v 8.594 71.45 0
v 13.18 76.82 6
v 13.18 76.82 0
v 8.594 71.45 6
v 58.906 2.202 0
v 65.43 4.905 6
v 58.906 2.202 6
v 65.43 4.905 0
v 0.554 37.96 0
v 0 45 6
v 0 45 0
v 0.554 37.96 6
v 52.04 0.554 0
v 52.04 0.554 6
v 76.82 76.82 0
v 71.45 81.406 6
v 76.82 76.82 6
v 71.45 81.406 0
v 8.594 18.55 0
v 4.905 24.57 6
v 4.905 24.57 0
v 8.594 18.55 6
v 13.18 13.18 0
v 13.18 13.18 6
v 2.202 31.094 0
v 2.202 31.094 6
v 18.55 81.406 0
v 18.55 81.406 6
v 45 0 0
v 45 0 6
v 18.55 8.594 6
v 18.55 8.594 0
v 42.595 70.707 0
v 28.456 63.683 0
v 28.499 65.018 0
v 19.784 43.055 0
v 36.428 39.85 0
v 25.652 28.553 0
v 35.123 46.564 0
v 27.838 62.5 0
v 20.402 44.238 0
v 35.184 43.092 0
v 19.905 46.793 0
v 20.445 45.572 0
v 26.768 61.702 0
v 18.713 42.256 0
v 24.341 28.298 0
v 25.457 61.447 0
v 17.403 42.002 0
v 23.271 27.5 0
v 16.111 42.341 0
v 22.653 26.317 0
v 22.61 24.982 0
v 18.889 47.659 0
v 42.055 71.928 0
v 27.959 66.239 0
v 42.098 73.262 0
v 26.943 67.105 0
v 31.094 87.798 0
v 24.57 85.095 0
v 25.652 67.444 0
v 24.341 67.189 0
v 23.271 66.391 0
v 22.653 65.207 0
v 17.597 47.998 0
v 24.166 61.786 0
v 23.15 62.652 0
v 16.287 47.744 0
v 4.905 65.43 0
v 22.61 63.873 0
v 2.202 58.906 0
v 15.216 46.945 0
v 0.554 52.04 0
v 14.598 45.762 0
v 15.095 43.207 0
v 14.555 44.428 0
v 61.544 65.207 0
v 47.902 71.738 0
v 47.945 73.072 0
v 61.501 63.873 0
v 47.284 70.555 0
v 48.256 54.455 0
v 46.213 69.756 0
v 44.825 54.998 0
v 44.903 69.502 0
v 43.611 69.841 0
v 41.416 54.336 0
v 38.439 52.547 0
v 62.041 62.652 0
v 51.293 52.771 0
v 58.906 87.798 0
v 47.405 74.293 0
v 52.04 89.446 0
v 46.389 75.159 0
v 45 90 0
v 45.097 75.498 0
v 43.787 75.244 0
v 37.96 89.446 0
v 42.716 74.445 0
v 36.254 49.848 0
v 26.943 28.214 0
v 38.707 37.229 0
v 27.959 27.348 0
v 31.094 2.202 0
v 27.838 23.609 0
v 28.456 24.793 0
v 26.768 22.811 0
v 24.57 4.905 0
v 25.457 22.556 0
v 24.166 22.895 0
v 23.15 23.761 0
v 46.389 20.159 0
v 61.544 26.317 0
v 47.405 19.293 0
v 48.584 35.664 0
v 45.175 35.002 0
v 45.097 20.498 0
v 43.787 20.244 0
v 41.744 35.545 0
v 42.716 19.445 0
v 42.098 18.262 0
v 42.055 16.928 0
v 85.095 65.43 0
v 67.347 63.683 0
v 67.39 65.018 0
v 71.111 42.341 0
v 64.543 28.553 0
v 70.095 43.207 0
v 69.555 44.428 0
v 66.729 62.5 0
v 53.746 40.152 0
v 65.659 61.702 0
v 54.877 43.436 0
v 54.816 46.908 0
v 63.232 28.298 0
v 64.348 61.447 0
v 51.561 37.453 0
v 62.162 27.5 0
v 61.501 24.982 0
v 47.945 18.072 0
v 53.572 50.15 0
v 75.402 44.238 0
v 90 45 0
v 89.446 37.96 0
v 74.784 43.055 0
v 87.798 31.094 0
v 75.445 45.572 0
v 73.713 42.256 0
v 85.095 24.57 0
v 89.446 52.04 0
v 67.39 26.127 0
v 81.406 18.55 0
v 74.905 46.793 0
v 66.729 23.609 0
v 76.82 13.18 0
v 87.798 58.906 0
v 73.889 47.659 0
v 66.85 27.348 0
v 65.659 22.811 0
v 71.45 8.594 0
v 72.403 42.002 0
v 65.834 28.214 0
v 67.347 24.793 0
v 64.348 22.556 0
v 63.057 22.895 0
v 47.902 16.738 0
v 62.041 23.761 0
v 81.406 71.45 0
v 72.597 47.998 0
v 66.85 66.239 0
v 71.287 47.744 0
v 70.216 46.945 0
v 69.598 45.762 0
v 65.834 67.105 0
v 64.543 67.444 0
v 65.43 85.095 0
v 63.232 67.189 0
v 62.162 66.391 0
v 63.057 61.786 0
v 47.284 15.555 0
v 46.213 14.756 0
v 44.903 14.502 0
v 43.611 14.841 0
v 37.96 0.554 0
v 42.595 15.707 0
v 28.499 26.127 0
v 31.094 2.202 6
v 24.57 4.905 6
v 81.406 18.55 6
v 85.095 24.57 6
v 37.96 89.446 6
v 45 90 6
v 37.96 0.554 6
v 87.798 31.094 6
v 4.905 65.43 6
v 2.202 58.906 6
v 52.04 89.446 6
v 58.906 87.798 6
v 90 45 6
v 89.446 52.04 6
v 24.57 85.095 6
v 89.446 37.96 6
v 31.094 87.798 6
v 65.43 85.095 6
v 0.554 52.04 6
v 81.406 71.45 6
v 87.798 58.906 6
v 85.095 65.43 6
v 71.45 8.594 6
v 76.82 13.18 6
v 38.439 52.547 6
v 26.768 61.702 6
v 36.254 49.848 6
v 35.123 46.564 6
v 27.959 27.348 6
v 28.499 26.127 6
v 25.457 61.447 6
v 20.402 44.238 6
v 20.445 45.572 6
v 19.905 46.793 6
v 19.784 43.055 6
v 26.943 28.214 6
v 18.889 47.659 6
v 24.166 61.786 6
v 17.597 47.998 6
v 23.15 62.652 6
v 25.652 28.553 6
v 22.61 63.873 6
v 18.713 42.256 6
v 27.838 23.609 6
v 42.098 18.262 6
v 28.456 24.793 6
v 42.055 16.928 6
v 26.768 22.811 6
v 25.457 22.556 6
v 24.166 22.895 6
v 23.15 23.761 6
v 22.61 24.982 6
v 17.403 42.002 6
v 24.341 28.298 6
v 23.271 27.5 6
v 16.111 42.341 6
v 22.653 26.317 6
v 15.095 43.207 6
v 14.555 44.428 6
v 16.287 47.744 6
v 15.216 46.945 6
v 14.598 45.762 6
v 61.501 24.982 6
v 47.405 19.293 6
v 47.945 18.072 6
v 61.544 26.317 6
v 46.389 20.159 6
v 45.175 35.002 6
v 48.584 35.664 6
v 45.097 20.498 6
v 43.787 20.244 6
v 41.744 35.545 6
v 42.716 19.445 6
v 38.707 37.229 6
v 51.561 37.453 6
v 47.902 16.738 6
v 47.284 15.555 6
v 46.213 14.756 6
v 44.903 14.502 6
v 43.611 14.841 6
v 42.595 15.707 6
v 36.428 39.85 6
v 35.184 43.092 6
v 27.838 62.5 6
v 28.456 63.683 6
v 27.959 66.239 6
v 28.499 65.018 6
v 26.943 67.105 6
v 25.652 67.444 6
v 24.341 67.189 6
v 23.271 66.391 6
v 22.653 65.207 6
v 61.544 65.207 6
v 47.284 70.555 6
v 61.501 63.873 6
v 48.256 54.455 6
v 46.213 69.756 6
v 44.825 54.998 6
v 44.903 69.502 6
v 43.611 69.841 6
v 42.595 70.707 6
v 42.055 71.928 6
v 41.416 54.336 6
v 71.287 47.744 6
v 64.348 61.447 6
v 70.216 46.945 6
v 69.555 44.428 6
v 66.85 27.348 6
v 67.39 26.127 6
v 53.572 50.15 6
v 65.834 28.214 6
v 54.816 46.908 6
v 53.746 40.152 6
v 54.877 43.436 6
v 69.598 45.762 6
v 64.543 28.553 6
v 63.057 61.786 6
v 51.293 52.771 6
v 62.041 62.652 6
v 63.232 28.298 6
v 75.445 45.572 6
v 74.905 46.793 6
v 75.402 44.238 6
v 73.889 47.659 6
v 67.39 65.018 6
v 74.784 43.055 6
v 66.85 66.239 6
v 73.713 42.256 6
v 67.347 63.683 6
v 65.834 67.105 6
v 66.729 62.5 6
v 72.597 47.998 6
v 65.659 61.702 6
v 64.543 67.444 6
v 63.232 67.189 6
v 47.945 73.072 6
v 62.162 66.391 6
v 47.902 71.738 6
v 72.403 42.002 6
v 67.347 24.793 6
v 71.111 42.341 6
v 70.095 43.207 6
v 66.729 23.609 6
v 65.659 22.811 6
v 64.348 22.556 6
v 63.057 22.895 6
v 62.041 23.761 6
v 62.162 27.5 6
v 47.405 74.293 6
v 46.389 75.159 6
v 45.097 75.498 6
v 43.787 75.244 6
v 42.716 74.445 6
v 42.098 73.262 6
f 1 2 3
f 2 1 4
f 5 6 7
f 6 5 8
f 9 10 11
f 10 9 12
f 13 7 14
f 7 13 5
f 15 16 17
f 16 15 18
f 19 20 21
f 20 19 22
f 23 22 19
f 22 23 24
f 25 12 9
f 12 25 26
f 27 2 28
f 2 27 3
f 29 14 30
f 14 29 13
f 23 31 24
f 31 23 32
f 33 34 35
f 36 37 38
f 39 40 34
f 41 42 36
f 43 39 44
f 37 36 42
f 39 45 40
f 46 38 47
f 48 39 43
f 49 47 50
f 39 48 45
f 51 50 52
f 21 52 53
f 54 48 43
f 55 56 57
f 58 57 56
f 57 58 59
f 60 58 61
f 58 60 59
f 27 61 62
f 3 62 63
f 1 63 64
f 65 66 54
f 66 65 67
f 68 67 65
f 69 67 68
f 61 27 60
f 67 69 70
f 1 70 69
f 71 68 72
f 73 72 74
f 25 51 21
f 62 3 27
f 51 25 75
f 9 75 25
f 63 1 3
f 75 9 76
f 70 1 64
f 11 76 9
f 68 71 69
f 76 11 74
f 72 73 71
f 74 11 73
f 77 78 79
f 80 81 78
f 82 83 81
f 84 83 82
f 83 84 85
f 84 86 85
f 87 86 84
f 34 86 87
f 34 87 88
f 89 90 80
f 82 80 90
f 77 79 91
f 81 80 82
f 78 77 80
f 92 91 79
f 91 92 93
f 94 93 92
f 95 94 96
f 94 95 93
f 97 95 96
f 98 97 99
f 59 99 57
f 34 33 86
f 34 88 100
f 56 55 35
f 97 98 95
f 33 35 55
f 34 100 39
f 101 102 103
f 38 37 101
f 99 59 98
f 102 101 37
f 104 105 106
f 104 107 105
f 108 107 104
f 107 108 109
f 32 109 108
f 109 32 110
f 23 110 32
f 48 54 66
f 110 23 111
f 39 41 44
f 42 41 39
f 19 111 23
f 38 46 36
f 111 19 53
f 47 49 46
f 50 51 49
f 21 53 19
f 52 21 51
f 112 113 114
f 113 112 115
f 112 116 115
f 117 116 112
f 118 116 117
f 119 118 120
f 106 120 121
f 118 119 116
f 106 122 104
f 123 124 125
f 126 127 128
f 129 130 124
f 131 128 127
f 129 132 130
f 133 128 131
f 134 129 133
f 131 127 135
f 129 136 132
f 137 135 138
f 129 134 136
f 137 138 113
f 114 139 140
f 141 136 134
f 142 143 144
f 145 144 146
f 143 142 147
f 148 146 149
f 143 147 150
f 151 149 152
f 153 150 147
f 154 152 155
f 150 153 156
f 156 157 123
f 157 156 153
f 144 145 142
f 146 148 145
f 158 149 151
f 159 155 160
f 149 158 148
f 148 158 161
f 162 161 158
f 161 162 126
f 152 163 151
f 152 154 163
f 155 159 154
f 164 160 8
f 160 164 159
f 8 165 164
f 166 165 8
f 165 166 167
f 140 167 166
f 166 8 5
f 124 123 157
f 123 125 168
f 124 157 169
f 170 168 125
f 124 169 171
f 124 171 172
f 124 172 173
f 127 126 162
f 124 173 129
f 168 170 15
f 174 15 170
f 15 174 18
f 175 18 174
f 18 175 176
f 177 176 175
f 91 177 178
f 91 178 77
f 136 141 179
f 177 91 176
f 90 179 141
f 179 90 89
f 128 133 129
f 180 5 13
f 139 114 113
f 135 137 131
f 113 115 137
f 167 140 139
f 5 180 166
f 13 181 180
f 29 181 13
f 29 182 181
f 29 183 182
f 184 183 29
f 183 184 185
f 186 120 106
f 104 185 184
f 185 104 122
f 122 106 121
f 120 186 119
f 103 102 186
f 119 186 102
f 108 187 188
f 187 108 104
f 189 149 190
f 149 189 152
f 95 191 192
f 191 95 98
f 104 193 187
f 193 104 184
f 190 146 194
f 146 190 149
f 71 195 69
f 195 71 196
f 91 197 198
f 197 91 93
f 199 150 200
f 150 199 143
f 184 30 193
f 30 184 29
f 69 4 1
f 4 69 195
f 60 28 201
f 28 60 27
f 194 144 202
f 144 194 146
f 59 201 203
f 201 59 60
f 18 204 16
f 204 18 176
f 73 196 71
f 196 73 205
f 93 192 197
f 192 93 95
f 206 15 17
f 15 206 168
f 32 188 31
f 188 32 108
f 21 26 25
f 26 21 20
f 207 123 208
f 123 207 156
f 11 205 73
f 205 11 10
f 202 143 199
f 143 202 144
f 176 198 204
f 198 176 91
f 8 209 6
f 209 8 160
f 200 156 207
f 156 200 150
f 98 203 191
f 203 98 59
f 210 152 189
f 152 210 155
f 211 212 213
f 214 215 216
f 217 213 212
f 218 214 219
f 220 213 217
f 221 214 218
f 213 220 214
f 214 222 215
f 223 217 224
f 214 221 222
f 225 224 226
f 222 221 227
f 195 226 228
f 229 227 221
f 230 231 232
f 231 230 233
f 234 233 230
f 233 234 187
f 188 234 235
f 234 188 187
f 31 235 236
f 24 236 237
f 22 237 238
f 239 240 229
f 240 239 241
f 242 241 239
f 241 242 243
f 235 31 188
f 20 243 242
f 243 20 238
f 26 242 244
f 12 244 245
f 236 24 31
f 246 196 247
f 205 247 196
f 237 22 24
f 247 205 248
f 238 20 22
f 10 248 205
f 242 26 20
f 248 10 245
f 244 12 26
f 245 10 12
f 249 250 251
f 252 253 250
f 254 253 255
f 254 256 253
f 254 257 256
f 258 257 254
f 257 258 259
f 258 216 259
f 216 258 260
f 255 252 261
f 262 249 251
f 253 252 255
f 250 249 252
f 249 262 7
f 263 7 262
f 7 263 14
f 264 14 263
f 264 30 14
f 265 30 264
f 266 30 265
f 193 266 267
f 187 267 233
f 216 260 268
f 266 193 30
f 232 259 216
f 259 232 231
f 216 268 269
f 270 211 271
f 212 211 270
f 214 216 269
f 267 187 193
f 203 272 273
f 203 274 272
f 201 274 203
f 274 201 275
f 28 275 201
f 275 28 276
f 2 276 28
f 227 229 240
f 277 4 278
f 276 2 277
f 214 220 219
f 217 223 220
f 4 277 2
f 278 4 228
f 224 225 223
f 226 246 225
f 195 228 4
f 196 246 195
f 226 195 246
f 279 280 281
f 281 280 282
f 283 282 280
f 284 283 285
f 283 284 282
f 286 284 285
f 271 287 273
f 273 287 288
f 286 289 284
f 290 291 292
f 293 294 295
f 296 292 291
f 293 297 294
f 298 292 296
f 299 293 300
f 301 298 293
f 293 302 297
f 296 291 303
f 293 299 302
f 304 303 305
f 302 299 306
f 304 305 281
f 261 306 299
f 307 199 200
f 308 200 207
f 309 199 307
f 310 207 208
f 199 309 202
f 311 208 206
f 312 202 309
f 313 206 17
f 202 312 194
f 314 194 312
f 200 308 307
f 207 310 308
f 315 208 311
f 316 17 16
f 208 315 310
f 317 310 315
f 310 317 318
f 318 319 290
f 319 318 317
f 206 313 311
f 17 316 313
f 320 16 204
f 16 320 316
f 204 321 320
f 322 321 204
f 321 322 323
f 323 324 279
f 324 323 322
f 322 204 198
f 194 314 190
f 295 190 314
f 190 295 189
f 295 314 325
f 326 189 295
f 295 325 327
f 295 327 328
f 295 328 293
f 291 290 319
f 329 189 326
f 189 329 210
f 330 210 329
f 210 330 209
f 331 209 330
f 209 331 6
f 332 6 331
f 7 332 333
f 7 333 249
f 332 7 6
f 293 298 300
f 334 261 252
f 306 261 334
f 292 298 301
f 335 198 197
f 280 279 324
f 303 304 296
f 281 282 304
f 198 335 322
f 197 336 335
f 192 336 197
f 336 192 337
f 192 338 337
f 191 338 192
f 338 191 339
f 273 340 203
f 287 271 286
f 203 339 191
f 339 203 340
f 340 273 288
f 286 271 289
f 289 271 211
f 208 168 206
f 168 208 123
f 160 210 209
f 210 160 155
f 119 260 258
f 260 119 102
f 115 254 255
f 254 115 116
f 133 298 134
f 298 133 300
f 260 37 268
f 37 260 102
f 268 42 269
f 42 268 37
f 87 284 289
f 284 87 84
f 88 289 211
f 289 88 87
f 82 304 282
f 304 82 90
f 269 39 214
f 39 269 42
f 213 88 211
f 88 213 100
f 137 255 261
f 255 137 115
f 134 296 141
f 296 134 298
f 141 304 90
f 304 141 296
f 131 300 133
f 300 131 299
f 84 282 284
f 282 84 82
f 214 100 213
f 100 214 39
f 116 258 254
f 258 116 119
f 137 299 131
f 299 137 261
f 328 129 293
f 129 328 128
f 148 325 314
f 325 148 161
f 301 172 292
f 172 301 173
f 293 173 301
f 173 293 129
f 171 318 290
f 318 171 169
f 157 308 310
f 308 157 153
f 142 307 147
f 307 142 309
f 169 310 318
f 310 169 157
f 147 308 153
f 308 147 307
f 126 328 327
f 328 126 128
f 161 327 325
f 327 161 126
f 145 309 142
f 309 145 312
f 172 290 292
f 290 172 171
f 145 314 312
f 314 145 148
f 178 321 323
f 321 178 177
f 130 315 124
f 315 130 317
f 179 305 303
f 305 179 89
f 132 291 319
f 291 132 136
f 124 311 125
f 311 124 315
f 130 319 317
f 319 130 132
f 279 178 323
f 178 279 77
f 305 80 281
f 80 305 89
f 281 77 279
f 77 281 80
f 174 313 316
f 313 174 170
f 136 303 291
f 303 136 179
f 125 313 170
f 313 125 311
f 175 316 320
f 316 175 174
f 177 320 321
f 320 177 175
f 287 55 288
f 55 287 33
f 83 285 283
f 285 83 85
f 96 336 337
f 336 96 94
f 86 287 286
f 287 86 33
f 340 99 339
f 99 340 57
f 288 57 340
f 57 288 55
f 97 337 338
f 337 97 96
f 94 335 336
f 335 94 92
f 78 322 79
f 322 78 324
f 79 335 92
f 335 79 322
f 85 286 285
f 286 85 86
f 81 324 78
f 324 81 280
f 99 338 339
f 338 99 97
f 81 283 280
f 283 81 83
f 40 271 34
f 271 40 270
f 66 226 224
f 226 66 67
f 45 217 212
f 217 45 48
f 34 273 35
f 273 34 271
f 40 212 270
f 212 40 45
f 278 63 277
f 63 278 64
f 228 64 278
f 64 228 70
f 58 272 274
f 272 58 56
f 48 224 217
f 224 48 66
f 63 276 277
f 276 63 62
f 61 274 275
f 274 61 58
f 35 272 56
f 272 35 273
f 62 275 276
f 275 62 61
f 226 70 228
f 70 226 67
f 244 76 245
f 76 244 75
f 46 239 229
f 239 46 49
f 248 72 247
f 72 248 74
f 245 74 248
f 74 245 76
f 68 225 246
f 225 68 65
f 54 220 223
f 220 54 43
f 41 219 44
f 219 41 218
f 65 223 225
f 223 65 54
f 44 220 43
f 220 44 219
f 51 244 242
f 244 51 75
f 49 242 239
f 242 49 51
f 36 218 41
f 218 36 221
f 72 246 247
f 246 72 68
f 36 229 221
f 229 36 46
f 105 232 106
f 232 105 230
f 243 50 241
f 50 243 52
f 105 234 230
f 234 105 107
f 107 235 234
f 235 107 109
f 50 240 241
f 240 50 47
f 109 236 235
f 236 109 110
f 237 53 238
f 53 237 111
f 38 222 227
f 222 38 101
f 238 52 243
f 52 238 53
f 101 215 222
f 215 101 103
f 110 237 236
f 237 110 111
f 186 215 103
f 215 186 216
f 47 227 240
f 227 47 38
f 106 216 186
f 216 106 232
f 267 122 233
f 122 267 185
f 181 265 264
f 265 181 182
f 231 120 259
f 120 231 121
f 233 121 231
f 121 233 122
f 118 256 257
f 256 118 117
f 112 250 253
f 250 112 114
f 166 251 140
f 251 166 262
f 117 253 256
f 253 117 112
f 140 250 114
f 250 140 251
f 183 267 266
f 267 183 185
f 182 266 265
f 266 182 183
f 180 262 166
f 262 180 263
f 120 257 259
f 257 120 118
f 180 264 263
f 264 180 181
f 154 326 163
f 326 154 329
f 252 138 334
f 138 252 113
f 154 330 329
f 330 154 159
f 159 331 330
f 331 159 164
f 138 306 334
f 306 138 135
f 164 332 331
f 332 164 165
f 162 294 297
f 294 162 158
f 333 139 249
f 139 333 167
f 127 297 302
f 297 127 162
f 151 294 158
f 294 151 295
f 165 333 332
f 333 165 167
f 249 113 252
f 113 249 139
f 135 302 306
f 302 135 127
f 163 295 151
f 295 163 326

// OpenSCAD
$fn = 32;

// ----------------------------------------------------------------------
// Spacer plate: round flange R45, 8 bolts
// ----------------------------------------------------------------------

// --- parameters (mm) ---
bore_r = 10;              // centre bore radius
bolt_r = 3;               // bolt hole radius
plate_t = 6;              // plate thickness, Z (extrusion height)
flange_r = 45;            // flange radius
n_bolt = 8;               // bolt hole count
ring_r = 27.5;            // bolt circle radius
fit_tol = 0.02;           // declared fit tolerance (prompt contract)
free_tol = 0.2;           // declared free tolerance (prompt contract)

profile = [[90, 45], [89.446, 52.04], [87.798, 58.906], [85.095, 65.43], [81.406, 71.45], [76.82, 76.82], [71.45, 81.406], [65.43, 85.095], [58.906, 87.798], [52.04, 89.446], [45, 90], [37.96, 89.446], [31.094, 87.798], [24.57, 85.095], [18.55, 81.406], [13.18, 76.82], [8.594, 71.45], [4.905, 65.43], [2.202, 58.906], [0.554, 52.04], [0, 45], [0.554, 37.96], [2.202, 31.094], [4.905, 24.57], [8.594, 18.55], [13.18, 13.18], [18.55, 8.594], [24.57, 4.905], [31.094, 2.202], [37.96, 0.554], [45, 0], [52.04, 0.554], [58.906, 2.202], [65.43, 4.905], [71.45, 8.594], [76.82, 13.18], [81.406, 18.55], [85.095, 24.57], [87.798, 31.094], [89.446, 37.96]];  // primary outline, 40 points, counter clockwise
void_1 = [[54.816, 46.908], [53.572, 50.15], [51.293, 52.771], [48.256, 54.455], [44.825, 54.998], [41.416, 54.336], [38.439, 52.547], [36.254, 49.848], [35.123, 46.564], [35.184, 43.092], [36.428, 39.85], [38.707, 37.229], [41.744, 35.545], [45.175, 35.002], [48.584, 35.664], [51.561, 37.453], [53.746, 40.152], [54.877, 43.436]];  // centre bore, 18 points
void_2 = [[75.445, 45.572], [74.905, 46.793], [73.889, 47.659], [72.597, 47.998], [71.287, 47.744], [70.216, 46.945], [69.598, 45.762], [69.555, 44.428], [70.095, 43.207], [71.111, 42.341], [72.403, 42.002], [73.713, 42.256], [74.784, 43.055], [75.402, 44.238]];  // bolt hole 1, 14 points
void_3 = [[67.39, 65.018], [66.85, 66.239], [65.834, 67.105], [64.543, 67.444], [63.232, 67.189], [62.162, 66.391], [61.544, 65.207], [61.501, 63.873], [62.041, 62.652], [63.057, 61.786], [64.348, 61.447], [65.659, 61.702], [66.729, 62.5], [67.347, 63.683]];  // bolt hole 2, 14 points
void_4 = [[47.945, 73.072], [47.405, 74.293], [46.389, 75.159], [45.097, 75.498], [43.787, 75.244], [42.716, 74.445], [42.098, 73.262], [42.055, 71.928], [42.595, 70.707], [43.611, 69.841], [44.903, 69.502], [46.213, 69.756], [47.284, 70.555], [47.902, 71.738]];  // bolt hole 3, 14 points
void_5 = [[28.499, 65.018], [27.959, 66.239], [26.943, 67.105], [25.652, 67.444], [24.341, 67.189], [23.271, 66.391], [22.653, 65.207], [22.61, 63.873], [23.15, 62.652], [24.166, 61.786], [25.457, 61.447], [26.768, 61.702], [27.838, 62.5], [28.456, 63.683]];  // bolt hole 4, 14 points
void_6 = [[20.445, 45.572], [19.905, 46.793], [18.889, 47.659], [17.597, 47.998], [16.287, 47.744], [15.216, 46.945], [14.598, 45.762], [14.555, 44.428], [15.095, 43.207], [16.111, 42.341], [17.403, 42.002], [18.713, 42.256], [19.784, 43.055], [20.402, 44.238]];  // bolt hole 5, 14 points
void_7 = [[28.499, 26.127], [27.959, 27.348], [26.943, 28.214], [25.652, 28.553], [24.341, 28.298], [23.271, 27.5], [22.653, 26.317], [22.61, 24.982], [23.15, 23.761], [24.166, 22.895], [25.457, 22.556], [26.768, 22.811], [27.838, 23.609], [28.456, 24.793]];  // bolt hole 6, 14 points
void_8 = [[47.945, 18.072], [47.405, 19.293], [46.389, 20.159], [45.097, 20.498], [43.787, 20.244], [42.716, 19.445], [42.098, 18.262], [42.055, 16.928], [42.595, 15.707], [43.611, 14.841], [44.903, 14.502], [46.213, 14.756], [47.284, 15.555], [47.902, 16.738]];  // bolt hole 7, 14 points
void_9 = [[67.39, 26.127], [66.85, 27.348], [65.834, 28.214], [64.543, 28.553], [63.232, 28.298], [62.162, 27.5], [61.544, 26.317], [61.501, 24.982], [62.041, 23.761], [63.057, 22.895], [64.348, 22.556], [65.659, 22.811], [66.729, 23.609], [67.347, 24.793]];  // bolt hole 8, 14 points

// --- the one profile operation ---
difference() {
  linear_extrude(height = plate_t) polygon(points = profile);
  translate([0, 0, -1])
    linear_extrude(height = plate_t + 2) polygon(points = void_1);
  translate([0, 0, -1])
    linear_extrude(height = plate_t + 2) polygon(points = void_2);
  translate([0, 0, -1])
    linear_extrude(height = plate_t + 2) polygon(points = void_3);
  translate([0, 0, -1])
    linear_extrude(height = plate_t + 2) polygon(points = void_4);
  translate([0, 0, -1])
    linear_extrude(height = plate_t + 2) polygon(points = void_5);
  translate([0, 0, -1])
    linear_extrude(height = plate_t + 2) polygon(points = void_6);
  translate([0, 0, -1])
    linear_extrude(height = plate_t + 2) polygon(points = void_7);
  translate([0, 0, -1])
    linear_extrude(height = plate_t + 2) polygon(points = void_8);
  translate([0, 0, -1])
    linear_extrude(height = plate_t + 2) polygon(points = void_9);
}
